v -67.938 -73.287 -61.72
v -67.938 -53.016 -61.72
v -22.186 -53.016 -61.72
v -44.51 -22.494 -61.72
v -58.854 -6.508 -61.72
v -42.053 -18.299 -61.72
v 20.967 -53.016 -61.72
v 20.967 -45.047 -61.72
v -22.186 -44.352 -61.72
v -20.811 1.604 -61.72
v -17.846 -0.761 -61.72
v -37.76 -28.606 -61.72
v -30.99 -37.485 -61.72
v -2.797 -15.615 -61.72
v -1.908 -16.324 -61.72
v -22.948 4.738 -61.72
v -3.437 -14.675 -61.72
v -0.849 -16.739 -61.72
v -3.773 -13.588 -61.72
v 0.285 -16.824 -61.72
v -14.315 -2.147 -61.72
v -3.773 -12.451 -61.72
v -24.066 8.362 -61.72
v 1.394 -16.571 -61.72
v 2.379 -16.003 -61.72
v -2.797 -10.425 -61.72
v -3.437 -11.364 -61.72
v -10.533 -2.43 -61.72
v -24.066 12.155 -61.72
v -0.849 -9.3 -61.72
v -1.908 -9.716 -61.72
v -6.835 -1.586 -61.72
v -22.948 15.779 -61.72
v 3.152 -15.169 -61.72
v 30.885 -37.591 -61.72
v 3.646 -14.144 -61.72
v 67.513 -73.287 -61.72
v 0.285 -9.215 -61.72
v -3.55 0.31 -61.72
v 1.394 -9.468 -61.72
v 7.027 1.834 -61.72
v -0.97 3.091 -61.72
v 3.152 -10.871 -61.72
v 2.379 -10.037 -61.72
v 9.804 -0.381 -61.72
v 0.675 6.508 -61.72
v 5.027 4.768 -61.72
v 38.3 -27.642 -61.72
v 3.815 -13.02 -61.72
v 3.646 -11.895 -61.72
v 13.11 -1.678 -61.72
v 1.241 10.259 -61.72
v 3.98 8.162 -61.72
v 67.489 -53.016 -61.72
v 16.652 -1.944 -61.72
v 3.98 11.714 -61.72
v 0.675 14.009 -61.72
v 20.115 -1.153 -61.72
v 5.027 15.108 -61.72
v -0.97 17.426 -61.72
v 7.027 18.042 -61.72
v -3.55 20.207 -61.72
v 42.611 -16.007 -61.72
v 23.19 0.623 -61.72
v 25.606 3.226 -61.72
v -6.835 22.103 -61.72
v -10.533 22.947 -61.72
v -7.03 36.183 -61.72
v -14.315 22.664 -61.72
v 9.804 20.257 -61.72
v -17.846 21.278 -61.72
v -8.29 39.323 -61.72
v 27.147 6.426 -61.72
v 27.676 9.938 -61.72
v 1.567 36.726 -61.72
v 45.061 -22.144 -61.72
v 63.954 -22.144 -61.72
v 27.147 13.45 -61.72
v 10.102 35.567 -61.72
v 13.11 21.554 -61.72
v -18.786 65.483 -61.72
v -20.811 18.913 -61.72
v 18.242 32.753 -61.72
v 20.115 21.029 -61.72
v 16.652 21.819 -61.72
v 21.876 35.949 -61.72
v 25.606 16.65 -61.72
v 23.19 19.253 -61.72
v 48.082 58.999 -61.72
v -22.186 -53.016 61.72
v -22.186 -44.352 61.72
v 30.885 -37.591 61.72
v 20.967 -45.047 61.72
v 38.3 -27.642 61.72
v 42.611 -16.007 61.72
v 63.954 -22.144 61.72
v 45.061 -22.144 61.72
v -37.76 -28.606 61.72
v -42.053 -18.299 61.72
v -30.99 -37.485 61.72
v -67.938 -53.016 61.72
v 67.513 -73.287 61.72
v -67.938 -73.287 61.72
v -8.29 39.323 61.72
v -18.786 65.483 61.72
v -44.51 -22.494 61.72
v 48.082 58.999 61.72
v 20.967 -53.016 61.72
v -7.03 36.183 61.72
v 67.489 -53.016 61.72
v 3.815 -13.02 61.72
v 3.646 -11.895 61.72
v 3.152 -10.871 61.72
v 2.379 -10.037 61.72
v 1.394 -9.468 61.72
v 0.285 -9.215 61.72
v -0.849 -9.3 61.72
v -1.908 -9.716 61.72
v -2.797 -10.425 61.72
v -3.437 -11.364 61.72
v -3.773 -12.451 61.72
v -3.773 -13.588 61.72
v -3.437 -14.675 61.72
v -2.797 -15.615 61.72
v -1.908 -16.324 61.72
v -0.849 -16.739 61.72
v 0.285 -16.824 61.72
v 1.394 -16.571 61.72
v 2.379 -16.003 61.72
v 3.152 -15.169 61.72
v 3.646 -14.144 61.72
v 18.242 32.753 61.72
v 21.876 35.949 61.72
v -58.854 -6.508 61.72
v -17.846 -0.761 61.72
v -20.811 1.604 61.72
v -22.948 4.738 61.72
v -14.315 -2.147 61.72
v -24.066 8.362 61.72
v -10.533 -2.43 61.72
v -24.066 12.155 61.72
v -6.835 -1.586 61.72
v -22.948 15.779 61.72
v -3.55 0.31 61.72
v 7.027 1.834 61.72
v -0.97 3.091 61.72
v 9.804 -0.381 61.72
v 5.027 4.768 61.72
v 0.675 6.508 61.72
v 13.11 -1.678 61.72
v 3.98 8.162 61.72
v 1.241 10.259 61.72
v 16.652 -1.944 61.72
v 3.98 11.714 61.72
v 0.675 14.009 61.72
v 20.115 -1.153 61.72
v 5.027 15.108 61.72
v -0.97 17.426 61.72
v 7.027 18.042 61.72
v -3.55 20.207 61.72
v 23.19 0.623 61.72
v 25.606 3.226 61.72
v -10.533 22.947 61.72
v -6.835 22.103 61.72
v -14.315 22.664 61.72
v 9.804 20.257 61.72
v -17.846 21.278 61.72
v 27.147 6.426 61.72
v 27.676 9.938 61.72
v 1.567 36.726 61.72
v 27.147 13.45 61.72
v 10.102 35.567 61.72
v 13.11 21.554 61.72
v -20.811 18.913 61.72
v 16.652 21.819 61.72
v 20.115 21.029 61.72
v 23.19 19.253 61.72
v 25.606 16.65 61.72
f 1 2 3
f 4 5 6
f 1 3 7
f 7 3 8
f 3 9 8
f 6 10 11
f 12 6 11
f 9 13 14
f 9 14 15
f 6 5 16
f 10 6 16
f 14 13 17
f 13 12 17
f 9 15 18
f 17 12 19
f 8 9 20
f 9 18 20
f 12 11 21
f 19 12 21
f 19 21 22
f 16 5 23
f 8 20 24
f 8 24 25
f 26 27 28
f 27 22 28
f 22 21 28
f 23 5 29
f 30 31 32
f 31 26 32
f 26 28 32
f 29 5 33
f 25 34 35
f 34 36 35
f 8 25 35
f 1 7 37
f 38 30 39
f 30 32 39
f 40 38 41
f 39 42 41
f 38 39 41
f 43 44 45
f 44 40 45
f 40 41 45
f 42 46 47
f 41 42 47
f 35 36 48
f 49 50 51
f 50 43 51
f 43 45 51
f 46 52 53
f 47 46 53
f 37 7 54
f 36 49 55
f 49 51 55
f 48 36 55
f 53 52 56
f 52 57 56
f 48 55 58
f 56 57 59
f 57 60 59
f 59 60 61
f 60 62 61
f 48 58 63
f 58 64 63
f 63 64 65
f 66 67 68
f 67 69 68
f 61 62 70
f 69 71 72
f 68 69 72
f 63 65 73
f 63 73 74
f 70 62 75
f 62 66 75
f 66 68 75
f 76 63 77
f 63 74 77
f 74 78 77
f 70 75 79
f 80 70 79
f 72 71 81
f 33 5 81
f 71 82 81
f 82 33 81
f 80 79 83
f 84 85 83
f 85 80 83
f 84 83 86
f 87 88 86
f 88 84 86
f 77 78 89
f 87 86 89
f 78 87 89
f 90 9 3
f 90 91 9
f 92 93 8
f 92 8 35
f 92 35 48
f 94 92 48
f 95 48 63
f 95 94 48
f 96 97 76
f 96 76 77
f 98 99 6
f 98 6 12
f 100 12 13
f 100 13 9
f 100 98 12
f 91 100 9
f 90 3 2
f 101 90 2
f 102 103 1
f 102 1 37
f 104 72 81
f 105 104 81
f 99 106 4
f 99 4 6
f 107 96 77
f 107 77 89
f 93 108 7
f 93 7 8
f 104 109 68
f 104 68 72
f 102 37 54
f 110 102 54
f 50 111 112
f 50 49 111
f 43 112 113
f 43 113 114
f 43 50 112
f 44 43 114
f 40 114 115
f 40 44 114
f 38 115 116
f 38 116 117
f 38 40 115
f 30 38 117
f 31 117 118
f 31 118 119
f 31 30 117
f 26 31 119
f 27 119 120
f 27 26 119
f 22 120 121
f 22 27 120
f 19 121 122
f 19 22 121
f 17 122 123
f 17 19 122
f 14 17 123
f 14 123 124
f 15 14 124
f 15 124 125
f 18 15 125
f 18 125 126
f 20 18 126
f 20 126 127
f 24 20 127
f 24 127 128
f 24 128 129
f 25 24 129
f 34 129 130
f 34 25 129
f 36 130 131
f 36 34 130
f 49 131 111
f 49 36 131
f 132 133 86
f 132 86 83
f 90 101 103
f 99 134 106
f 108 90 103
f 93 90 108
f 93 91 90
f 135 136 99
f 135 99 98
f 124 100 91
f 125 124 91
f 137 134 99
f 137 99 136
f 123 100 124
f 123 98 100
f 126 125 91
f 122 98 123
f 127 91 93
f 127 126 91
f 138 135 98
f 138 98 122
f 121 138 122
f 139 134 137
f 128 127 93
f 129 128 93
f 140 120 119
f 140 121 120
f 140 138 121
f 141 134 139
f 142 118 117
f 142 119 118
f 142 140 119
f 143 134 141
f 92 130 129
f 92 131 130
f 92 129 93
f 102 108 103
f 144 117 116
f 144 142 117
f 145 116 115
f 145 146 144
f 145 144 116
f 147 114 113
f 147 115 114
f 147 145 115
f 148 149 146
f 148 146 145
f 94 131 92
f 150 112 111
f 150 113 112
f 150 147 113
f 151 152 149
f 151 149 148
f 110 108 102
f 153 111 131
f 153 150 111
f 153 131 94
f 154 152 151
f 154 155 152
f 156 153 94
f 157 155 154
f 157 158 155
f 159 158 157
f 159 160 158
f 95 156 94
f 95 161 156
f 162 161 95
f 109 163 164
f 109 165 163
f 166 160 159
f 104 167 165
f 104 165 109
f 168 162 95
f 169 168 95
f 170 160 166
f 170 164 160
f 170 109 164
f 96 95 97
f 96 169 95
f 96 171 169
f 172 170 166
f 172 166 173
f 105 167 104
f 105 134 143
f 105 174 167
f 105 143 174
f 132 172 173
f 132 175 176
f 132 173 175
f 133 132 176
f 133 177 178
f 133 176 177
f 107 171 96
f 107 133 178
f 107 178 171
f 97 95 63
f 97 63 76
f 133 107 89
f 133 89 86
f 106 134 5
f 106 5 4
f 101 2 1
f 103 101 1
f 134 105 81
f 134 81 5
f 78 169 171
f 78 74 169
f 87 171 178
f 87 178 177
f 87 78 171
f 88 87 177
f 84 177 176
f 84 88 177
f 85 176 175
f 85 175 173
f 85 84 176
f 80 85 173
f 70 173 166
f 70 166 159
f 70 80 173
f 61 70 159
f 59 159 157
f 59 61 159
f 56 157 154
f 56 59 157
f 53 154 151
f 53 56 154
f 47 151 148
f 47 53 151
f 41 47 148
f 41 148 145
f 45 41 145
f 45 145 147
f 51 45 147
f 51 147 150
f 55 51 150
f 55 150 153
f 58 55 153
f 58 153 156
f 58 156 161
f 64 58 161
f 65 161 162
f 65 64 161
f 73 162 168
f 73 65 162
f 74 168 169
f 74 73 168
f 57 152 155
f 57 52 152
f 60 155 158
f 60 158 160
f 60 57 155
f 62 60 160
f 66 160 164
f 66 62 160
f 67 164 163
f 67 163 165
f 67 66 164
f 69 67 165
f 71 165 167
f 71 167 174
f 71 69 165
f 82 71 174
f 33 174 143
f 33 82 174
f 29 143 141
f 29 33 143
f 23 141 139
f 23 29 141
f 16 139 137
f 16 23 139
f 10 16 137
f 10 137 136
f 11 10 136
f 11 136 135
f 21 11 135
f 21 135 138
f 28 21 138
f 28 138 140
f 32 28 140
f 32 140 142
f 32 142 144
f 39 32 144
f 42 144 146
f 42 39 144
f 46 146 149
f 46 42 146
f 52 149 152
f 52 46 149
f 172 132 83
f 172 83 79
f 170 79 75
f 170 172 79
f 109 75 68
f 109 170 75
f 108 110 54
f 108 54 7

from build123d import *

# Parameters (mm, degrees)
F0_R     = 3.815165
F0_R_2   = 12.72436
F0_R_3   = 11.914866
F1_DEPTH = 61.71997


with BuildPart() as f1:
    # F0 (on Top) → F1 (new body, symmetric)
    with BuildSketch(Plane.XY):
        Polygon((-22.186497, -53.015659), (-54.091621, -53.015659), (-67.938353, -53.015659), (-67.938353, -73.286796), (67.512539, -73.286796), (67.489434, -53.015659), (20.967111, -53.015659), align=None)
        with BuildLine():
            Line((-22.186497, -44.352168), (-22.186497, -53.015659))
            Line((-22.186497, -53.015659), (20.967111, -53.015659))
            Line((20.967111, -53.015659), (20.967111, -45.047))
            ThreePointArc((20.967111, -45.047), (-0.701729, -50.415619), (-22.186497, -44.352168))
        make_face()
        with BuildLine():
            ThreePointArc((-42.052504, -18.299424), (-34.660477, -33.263368), (-22.186497, -44.352168))
            ThreePointArc((-22.186497, -44.352168), (-0.701729, -50.415619), (20.967111, -45.047))
            ThreePointArc((20.967111, -45.047), (34.948374, -32.881486), (42.611378, -16.006836))
            ThreePointArc((42.611378, -16.006836), (43.342832, -11.446167), (43.587566, -6.833702))
            ThreePointArc((43.587566, -6.833702), (38.545513, 13.516219), (24.585849, 29.158129))
            ThreePointArc((24.585849, 29.158129), (21.489345, 31.088375), (18.242246, 32.752865))
            ThreePointArc((18.242246, 32.752865), (5.862878, 36.357761), (-7.029507, 36.183293))
            ThreePointArc((-7.029507, 36.183293), (-8.799871, 35.856322), (-10.555224, 35.456523))
            ThreePointArc((-10.555224, 35.456523), (-37.607429, 15.201659), (-42.052504, -18.299424))
        make_face()
        with Locations((0, -13.019726)):
            Circle(F0_R, mode=Mode.SUBTRACT)
        with Locations((-11.483821, 10.258501)):
            Circle(F0_R_2, mode=Mode.SUBTRACT)
        with Locations((15.761618, 9.937936)):
            Circle(F0_R_3, mode=Mode.SUBTRACT)
        with BuildLine():
            Line((-44.51011, -22.493784), (-42.052504, -18.299424))
            ThreePointArc((-42.052504, -18.299424), (-37.607429, 15.201659), (-10.555224, 35.456523))
            Line((-10.555224, 35.456523), (-8.289508, 39.323387))
            Line((-8.289508, 39.323387), (-18.786313, 65.482855))
            Line((-18.786313, 65.482855), (-58.853593, -6.507952))
            Line((-58.853593, -6.507952), (-44.51011, -22.493784))
        make_face()
        with BuildLine():
            ThreePointArc((43.587566, -6.833702), (43.342832, -11.446167), (42.611378, -16.006836))
            Line((42.611378, -16.006836), (45.060731, -22.143964))
            Line((45.060731, -22.143964), (63.954249, -22.143964))
            Line((63.954249, -22.143964), (48.082457, 58.999361))
            Line((48.082457, 58.999361), (21.875692, 35.948728))
            Line((21.875692, 35.948728), (24.585849, 29.158129))
            ThreePointArc((24.585849, 29.158129), (38.545513, 13.516219), (43.587566, -6.833702))
        make_face()
        with BuildLine():
            Line((-8.289508, 39.323387), (-10.555224, 35.456523))
            ThreePointArc((-10.555224, 35.456523), (-8.799871, 35.856322), (-7.029507, 36.183293))
            Line((-7.029507, 36.183293), (-8.289508, 39.323387))
        make_face()
        with BuildLine():
            ThreePointArc((18.242246, 32.752865), (21.489345, 31.088375), (24.585849, 29.158129))
            Line((24.585849, 29.158129), (21.875692, 35.948728))
            Line((21.875692, 35.948728), (18.242246, 32.752865))
        make_face()
    extrude(amount=F1_DEPTH, both=True)


solid = f1.part
